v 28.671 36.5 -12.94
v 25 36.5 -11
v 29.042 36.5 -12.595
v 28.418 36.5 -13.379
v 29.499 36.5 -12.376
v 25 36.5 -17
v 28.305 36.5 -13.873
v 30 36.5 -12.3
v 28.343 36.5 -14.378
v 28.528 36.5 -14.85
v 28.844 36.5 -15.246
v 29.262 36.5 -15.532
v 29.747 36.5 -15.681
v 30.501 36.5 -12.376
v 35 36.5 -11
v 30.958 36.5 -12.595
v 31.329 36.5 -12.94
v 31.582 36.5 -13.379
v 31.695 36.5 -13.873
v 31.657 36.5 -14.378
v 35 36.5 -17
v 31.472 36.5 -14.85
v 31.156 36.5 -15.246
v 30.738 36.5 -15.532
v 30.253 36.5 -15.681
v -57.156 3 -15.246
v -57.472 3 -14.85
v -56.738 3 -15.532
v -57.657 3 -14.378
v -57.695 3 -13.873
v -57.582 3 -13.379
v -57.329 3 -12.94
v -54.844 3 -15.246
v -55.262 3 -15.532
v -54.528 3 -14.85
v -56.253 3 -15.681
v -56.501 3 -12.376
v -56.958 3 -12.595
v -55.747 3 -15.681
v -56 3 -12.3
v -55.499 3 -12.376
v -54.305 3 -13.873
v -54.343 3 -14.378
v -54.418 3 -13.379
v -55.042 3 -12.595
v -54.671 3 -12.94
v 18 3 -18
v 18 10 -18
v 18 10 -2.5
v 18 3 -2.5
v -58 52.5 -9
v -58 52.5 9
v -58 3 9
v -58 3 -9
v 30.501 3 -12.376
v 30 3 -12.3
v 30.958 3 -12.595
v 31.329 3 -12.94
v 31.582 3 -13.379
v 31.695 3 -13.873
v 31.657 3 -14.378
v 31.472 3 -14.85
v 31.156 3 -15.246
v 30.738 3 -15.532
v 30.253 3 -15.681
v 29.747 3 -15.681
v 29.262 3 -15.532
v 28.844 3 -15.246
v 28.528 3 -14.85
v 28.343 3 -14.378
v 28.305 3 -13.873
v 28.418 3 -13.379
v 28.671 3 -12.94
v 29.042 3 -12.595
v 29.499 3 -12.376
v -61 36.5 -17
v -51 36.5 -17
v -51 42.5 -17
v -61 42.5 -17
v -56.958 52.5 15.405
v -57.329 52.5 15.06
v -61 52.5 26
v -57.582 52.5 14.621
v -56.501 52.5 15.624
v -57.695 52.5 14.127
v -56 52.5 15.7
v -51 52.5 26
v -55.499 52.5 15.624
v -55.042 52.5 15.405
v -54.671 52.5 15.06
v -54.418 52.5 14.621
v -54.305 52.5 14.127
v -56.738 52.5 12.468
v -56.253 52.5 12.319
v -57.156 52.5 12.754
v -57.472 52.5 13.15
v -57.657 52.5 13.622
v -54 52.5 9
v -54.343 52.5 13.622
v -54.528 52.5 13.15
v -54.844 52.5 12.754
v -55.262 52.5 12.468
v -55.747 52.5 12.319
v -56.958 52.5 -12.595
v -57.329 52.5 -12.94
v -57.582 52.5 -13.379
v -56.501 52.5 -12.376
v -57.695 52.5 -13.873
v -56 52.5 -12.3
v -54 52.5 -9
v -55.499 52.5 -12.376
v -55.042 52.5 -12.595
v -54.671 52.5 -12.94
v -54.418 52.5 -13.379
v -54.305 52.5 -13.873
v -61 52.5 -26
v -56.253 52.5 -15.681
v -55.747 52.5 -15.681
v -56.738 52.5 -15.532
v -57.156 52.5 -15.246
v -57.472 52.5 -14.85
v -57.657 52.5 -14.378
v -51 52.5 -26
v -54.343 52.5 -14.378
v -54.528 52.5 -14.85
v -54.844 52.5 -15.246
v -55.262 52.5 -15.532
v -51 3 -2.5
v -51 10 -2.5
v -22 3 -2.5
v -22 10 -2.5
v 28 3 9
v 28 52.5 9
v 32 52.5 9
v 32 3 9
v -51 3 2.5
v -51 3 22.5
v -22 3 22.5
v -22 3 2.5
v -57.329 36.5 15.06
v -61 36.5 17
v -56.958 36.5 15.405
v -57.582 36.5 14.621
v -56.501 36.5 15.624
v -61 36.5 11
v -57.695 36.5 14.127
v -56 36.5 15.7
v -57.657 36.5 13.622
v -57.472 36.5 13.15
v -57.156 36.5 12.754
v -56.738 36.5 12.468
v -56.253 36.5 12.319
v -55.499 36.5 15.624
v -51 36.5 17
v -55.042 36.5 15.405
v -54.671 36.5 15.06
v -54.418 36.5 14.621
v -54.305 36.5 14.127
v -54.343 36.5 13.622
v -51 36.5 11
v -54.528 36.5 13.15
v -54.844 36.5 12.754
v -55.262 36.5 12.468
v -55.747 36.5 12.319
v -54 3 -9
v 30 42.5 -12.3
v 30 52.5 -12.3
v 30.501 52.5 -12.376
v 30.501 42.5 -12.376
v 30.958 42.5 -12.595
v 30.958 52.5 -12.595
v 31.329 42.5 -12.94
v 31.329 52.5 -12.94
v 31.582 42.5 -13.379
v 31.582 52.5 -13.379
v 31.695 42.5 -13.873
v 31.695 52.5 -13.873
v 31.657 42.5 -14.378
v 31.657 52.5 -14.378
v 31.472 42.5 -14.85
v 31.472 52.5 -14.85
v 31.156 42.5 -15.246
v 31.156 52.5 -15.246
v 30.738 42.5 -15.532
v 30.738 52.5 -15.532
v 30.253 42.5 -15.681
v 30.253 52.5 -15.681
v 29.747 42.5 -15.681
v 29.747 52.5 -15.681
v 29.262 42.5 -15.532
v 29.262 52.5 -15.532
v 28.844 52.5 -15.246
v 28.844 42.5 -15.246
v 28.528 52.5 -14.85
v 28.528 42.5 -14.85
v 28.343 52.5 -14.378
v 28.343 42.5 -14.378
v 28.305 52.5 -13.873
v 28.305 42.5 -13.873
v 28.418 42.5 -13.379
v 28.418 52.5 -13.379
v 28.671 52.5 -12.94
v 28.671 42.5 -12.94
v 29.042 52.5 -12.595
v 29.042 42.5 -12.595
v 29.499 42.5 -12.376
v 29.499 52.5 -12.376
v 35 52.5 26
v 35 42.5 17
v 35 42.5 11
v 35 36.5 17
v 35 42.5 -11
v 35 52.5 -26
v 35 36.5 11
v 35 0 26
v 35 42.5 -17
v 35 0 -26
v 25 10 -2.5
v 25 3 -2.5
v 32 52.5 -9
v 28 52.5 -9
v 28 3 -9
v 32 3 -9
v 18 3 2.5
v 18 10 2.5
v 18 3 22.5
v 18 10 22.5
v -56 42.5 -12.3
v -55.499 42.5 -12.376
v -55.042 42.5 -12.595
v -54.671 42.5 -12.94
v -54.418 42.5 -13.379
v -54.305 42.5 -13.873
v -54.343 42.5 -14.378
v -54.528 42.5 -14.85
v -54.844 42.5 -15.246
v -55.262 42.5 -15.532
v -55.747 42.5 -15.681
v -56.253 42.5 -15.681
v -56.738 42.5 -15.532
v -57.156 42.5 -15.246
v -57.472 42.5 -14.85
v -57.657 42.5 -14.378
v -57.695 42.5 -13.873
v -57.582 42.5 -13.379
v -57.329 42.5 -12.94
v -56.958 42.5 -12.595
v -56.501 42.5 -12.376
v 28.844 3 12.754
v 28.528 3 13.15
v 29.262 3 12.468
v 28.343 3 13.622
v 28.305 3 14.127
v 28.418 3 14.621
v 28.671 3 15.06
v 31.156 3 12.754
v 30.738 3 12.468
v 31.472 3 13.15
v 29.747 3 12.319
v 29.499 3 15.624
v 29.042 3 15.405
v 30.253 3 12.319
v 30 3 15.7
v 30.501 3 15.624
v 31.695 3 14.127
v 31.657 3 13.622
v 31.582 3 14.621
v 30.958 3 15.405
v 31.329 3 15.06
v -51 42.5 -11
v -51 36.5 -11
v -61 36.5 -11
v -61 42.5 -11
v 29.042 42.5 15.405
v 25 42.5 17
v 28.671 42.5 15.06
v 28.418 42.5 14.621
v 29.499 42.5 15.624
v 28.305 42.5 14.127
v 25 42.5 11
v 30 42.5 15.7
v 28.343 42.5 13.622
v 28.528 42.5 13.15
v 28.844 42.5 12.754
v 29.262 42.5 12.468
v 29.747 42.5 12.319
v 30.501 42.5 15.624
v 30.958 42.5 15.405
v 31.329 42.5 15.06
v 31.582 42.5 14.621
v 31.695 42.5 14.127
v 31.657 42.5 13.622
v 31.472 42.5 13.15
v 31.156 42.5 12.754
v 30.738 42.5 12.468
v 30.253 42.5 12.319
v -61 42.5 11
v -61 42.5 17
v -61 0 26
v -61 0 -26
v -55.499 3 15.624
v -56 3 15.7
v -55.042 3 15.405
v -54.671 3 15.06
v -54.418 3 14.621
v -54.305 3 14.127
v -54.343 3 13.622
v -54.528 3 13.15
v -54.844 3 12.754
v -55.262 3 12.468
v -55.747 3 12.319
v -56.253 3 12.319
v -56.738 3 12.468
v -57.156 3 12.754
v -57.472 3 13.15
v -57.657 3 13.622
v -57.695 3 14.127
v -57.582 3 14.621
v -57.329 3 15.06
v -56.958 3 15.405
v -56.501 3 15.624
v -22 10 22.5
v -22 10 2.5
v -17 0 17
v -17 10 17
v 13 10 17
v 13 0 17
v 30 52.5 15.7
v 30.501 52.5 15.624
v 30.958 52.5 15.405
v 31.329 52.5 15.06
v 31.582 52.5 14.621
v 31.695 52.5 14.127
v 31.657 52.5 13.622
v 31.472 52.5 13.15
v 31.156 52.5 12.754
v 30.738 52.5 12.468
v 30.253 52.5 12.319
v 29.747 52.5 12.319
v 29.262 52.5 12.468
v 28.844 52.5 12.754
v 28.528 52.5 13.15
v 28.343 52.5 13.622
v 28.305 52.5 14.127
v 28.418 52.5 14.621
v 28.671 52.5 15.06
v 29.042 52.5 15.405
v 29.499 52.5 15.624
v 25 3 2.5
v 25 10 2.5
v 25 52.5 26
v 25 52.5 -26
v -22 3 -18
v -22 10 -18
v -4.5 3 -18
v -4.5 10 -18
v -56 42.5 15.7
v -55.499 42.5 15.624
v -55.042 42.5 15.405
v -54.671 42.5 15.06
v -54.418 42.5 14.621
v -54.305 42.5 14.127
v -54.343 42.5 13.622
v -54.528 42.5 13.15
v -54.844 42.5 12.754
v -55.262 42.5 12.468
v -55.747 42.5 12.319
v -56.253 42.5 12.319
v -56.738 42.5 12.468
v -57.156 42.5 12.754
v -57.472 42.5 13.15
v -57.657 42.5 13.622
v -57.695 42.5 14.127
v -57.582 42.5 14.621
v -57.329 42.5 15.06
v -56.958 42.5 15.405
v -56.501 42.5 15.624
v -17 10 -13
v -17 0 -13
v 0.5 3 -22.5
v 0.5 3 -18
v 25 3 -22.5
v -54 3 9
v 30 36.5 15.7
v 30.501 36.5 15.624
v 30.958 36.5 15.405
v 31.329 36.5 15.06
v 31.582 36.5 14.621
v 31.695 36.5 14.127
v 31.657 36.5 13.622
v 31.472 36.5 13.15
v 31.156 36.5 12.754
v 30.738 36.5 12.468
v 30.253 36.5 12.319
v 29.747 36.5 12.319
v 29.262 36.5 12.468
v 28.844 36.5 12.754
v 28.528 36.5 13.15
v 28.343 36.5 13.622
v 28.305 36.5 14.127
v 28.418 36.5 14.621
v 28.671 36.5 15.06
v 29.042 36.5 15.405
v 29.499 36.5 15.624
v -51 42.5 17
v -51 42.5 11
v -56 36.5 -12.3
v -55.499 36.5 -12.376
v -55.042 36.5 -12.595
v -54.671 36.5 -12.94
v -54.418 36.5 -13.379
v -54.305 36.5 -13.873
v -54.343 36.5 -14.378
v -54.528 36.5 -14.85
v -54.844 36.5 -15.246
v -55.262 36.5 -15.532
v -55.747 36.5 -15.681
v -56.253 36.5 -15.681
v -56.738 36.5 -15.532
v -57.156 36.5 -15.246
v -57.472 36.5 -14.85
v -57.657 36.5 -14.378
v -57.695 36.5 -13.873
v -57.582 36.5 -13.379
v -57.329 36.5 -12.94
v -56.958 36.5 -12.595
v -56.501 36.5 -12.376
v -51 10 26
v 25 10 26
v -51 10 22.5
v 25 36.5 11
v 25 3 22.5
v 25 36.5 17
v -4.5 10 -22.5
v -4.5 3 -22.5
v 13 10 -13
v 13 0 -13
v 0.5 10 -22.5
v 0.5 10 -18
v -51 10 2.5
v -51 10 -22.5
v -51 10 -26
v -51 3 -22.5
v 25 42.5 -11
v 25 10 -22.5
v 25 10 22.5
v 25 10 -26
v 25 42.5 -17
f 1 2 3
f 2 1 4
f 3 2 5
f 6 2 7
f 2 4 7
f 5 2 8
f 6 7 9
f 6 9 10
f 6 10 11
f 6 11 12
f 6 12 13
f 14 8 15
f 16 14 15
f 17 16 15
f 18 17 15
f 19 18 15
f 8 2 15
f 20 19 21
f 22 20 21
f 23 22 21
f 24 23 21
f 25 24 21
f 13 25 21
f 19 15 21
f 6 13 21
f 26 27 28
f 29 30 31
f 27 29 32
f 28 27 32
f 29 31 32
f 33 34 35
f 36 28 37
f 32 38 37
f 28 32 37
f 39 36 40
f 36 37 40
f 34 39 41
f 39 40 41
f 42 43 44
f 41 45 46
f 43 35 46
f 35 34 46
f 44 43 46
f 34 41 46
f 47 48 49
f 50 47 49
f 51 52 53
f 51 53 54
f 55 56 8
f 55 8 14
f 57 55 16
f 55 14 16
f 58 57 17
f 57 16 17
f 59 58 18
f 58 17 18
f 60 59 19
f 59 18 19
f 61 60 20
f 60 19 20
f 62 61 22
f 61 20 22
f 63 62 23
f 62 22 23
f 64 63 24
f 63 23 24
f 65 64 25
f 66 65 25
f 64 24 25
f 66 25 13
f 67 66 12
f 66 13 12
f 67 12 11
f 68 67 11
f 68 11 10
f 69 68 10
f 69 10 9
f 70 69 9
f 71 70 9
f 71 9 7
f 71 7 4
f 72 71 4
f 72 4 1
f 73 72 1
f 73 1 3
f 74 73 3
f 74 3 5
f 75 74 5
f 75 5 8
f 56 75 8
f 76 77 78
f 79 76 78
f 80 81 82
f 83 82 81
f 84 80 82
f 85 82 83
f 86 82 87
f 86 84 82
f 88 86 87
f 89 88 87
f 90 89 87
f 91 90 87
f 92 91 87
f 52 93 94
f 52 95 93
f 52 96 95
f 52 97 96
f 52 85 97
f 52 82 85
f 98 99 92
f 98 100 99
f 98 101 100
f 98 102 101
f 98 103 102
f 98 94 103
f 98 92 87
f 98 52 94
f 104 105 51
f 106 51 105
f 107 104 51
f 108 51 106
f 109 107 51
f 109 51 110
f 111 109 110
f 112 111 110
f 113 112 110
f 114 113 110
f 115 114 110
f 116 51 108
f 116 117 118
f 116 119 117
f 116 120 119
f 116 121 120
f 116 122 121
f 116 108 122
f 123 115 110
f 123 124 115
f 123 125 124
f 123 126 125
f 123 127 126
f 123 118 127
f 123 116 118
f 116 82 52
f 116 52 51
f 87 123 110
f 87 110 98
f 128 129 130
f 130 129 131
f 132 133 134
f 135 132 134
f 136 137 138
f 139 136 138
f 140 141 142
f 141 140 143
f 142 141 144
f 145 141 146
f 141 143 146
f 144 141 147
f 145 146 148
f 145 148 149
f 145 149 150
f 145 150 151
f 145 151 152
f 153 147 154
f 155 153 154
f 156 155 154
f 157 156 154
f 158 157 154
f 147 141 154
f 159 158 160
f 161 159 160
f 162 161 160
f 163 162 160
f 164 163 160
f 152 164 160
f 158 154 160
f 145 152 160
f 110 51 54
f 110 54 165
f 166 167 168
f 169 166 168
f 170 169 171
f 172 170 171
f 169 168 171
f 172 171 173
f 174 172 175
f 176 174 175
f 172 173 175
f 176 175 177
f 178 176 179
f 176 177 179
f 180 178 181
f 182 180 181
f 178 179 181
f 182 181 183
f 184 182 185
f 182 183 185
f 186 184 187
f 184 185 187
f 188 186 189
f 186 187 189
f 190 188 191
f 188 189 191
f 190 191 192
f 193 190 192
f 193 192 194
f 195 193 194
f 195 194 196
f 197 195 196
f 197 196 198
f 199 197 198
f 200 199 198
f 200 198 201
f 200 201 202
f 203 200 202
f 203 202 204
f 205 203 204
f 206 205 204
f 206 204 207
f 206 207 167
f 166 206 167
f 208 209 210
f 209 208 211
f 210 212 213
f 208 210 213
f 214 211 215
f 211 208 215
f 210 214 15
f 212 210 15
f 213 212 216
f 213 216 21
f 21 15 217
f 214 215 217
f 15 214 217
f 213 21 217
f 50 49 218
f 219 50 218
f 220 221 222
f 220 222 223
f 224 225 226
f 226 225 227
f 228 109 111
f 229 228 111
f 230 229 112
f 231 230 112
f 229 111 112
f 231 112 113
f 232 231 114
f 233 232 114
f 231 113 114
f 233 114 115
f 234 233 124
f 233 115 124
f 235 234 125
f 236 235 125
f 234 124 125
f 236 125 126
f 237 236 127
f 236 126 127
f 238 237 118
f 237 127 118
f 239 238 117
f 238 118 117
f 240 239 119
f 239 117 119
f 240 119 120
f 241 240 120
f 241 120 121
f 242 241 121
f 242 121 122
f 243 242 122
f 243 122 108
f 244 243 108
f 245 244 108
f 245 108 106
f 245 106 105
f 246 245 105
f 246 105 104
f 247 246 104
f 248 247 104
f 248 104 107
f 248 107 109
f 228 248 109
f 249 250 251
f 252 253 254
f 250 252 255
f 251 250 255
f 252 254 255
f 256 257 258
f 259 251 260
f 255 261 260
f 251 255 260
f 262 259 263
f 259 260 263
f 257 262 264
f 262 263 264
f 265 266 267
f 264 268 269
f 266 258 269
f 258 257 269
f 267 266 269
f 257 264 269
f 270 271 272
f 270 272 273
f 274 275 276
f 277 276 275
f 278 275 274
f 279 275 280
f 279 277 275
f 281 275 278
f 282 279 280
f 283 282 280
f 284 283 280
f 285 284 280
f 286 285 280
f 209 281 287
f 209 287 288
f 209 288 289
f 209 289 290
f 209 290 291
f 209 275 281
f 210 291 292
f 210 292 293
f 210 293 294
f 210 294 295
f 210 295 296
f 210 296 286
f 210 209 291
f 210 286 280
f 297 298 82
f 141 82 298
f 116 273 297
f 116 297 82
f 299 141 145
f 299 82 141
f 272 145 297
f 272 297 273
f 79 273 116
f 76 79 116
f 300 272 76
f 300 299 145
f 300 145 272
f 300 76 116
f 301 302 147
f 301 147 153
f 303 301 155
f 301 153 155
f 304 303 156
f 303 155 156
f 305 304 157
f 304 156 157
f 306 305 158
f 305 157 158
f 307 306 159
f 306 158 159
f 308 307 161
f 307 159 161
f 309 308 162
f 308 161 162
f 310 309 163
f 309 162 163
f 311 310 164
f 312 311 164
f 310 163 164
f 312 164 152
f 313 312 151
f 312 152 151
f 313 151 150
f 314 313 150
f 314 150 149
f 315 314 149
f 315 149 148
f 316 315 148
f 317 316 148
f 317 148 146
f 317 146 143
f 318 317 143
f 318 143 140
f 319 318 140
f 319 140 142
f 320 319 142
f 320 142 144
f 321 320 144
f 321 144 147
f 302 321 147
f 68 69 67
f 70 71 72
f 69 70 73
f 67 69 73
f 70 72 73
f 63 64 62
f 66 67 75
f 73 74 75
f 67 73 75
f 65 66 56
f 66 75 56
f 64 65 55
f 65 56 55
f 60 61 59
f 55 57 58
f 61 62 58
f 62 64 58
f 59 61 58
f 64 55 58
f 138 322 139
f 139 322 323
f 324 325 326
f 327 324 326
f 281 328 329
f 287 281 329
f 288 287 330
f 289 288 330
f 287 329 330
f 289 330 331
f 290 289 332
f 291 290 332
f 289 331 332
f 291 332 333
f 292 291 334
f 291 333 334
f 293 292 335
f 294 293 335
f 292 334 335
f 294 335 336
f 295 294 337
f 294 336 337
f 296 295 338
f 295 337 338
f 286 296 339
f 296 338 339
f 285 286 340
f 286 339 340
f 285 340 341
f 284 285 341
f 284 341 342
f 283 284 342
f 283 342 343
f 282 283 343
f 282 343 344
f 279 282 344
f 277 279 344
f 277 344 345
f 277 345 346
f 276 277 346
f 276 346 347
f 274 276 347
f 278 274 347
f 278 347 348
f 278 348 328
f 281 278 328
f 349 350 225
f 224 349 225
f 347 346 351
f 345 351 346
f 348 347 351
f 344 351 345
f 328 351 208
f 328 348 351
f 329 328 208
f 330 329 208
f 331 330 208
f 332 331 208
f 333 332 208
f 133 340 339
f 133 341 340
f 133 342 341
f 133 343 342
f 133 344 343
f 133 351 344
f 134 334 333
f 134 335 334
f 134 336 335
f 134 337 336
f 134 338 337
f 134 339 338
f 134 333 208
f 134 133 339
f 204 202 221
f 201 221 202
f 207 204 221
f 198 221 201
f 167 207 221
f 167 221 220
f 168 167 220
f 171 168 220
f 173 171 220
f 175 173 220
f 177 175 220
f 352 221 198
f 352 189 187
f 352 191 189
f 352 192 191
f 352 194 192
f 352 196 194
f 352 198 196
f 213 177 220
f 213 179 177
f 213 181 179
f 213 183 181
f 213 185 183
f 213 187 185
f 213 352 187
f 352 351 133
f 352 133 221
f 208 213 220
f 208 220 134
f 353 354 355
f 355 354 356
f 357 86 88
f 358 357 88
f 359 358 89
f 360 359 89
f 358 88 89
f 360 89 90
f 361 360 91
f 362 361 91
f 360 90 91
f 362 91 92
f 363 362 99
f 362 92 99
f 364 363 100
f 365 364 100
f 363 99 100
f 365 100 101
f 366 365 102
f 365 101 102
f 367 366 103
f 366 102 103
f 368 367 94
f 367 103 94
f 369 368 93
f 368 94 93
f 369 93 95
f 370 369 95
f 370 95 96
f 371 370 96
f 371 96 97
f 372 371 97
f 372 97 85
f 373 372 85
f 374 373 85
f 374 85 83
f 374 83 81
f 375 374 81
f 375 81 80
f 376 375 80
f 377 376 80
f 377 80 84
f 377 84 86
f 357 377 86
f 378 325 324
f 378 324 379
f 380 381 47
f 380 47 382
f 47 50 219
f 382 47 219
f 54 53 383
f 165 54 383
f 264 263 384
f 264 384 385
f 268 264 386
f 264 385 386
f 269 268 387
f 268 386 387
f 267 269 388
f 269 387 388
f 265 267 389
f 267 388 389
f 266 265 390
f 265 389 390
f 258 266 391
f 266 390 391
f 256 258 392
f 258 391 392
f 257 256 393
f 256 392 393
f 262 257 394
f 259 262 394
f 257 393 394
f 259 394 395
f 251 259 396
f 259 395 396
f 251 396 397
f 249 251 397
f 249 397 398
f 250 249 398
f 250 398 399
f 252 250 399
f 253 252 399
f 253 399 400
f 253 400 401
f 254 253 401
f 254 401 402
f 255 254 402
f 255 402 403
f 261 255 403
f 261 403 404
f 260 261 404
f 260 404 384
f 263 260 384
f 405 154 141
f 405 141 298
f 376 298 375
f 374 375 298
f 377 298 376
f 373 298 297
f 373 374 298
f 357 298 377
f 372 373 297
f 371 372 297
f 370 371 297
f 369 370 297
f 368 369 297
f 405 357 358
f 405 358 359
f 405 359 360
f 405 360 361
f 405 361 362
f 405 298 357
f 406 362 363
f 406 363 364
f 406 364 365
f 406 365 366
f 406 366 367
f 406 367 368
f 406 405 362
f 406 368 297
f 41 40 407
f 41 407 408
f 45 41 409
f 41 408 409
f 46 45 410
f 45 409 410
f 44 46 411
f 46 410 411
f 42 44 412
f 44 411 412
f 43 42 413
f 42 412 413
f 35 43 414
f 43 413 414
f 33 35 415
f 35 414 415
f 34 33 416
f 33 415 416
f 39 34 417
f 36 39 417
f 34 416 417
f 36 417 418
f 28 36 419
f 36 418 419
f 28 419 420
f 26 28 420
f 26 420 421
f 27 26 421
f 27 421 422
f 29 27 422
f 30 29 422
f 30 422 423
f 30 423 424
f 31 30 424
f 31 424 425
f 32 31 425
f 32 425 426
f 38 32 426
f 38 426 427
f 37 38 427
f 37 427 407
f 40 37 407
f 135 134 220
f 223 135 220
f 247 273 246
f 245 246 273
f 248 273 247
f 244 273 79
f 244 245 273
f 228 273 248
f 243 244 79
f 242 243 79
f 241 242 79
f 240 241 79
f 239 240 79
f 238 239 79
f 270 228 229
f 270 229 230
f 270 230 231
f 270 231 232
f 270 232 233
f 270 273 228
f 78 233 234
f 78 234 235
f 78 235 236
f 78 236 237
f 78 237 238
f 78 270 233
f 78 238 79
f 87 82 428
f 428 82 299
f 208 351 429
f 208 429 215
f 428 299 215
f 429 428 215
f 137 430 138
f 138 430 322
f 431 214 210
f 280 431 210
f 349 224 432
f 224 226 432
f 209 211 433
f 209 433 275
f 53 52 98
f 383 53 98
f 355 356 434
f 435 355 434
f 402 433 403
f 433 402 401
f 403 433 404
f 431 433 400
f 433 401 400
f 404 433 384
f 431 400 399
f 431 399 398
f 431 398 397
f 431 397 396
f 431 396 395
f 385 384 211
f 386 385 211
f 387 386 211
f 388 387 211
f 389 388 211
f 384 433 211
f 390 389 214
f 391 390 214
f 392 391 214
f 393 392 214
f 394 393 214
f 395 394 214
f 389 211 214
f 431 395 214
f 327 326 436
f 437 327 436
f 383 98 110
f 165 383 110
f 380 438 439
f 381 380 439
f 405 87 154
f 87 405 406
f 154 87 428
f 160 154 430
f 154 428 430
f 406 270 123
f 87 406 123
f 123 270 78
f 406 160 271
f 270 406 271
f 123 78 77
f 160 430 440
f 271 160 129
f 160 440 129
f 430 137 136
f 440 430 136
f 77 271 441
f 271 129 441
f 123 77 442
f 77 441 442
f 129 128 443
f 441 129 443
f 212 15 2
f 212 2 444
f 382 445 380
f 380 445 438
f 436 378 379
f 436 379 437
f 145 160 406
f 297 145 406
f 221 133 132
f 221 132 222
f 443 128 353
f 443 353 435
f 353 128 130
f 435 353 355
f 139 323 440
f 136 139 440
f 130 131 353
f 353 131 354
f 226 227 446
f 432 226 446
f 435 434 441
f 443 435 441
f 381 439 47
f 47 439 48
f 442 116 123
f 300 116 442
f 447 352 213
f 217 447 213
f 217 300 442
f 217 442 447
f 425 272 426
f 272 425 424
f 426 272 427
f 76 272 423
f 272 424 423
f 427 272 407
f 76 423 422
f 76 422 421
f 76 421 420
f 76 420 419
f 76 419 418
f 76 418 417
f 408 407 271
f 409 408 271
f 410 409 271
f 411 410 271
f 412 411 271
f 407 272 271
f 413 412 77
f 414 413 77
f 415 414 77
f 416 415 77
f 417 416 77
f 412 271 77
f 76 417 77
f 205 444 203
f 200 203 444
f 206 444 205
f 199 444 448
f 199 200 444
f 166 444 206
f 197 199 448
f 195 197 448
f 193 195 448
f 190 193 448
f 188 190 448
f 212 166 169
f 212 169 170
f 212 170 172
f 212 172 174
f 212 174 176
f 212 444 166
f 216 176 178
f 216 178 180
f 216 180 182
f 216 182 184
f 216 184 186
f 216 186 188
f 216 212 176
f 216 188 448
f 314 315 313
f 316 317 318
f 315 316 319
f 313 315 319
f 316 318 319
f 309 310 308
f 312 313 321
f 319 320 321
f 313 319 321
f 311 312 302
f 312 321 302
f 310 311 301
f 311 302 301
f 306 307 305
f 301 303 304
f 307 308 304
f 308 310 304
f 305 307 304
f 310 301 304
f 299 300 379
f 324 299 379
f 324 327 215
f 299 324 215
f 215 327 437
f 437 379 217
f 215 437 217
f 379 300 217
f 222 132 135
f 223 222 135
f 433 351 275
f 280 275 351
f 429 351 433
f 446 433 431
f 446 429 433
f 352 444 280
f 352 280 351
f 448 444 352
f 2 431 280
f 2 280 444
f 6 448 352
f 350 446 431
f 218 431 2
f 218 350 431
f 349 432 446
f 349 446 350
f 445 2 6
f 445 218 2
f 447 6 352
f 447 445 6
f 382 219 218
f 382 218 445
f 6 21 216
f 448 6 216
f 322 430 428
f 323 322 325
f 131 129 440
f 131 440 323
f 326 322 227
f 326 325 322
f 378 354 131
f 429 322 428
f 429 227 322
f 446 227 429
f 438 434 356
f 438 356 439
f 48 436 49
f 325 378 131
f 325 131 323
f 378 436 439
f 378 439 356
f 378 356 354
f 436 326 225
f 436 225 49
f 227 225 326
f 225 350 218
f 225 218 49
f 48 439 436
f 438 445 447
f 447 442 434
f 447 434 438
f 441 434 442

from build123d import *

# Parameters (mm, degrees)
SKETCH1_W           = 96
SKETCH1_H           = 52
BOSS_EXTRUDE1_DEPTH = 10
SKETCH3_W           = 30
SKETCH3_H           = 30
CUT_EXTRUDE1_DEPTH  = 10
SKETCH4_W           = 10
SKETCH4_H           = 52
BOSS_EXTRUDE2_DEPTH = 42.5
CUT_EXTRUDE2_DEPTH  = 25
SKETCH10_W          = 6
SKETCH10_H          = 6
CUT_EXTRUDE7_DEPTH  = 113.464438824
SKETCH11_R          = 1.7
SKETCH11_W          = 4
SKETCH11_H          = 18
CUT_EXTRUDE8_DEPTH  = 60
SKETCH14_W          = 96
SKETCH14_H          = 52
SKETCH14_W_2        = 30
SKETCH14_H_2        = 30
BOSS_EXTRUDE3_DEPTH = 3


with BuildPart() as part:
    # Sketch1 → Boss-Extrude1 (new body)
    with BuildSketch(Plane(origin=(0, 0, 0), x_dir=(1, 0, 0), z_dir=(0, 1, 0))):
        with Locations((-13, 0)):
            Rectangle(SKETCH1_W, SKETCH1_H)
    extrude(amount=BOSS_EXTRUDE1_DEPTH)

    # Sketch3 → Cut-Extrude1 (cut)
    with BuildSketch(Plane(origin=(0, 10, 0), x_dir=(1, 0, 0), z_dir=(0, 1, 0))):
        with Locations((-2, -2)):
            Rectangle(SKETCH3_W, SKETCH3_H)
    extrude(amount=-CUT_EXTRUDE1_DEPTH, mode=Mode.SUBTRACT)

    # Sketch4 → Boss-Extrude2 (add)
    with BuildSketch(Plane(origin=(0, 10, 0), x_dir=(1, 0, 0), z_dir=(0, 1, 0))):
        with Locations((30, 0)):
            Rectangle(SKETCH4_W, SKETCH4_H)
        with Locations((-56, 0)):
            Rectangle(SKETCH4_W, SKETCH4_H)
    extrude(amount=BOSS_EXTRUDE2_DEPTH)

    # Sketch5 → Cut-Extrude2 (cut)
    with BuildSketch(Plane(origin=(0, 10, 0), x_dir=(1, 0, 0), z_dir=(0, 1, 0))):
        Polygon((25, 22.5), (0.5, 22.5), (0.5, 18), (18, 18), (18, 2.5), (25, 2.5), align=None)
        Polygon((-4.5, 22.5), (-51, 22.5), (-51, 2.5), (-22, 2.5), (-22, 18), (-4.5, 18), align=None)
        Polygon((-22, -2.5), (-51, -2.5), (-51, -22.5), (-22, -22.5), (-22, -20), align=None)
        Polygon((25, -22.5), (25, -2.5), (18, -2.5), (18, -20), (18, -22.5), align=None)
    extrude(amount=-CUT_EXTRUDE2_DEPTH, mode=Mode.SUBTRACT)

    # Sketch10 → Cut-Extrude7 (cut, through all)
    with BuildSketch(Plane(origin=(35, 0, 0), x_dir=(0, 0, -1), z_dir=(1, 0, 0))):
        with Locations((14, 39.5)):
            Rectangle(SKETCH10_W, SKETCH10_H)
        with Locations((-14, 39.5)):
            Rectangle(SKETCH10_W, SKETCH10_H)
    extrude(amount=-CUT_EXTRUDE7_DEPTH, mode=Mode.SUBTRACT)

    # Sketch11 → Cut-Extrude8 (cut)
    with BuildSketch(Plane(origin=(0, 52.5, 0), x_dir=(1, 0, 0), z_dir=(0, 1, 0))):
        with Locations(Location((-56, 14, 0), (0, 0, 270))):
            Circle(SKETCH11_R)
        with Locations(Location((-56, -14, 0), (0, 0, 270))):
            Circle(SKETCH11_R)
        with Locations(Location((30, -14, 0), (0, 0, 270))):
            Circle(SKETCH11_R)
        with Locations(Location((30, 14, 0), (0, 0, 270))):
            Circle(SKETCH11_R)
        with Locations((-56, 0)):
            Rectangle(SKETCH11_W, SKETCH11_H)
        with Locations((30, 0)):
            Rectangle(SKETCH11_W, SKETCH11_H)
    extrude(amount=-CUT_EXTRUDE8_DEPTH, mode=Mode.SUBTRACT)

    # Sketch14 → Boss-Extrude3 (add)
    with BuildSketch(Plane.XZ):
        with Locations((-13, 0)):
            Rectangle(SKETCH14_W, SKETCH14_H)
        with Locations((-2, 2)):
            Rectangle(SKETCH14_W_2, SKETCH14_H_2, mode=Mode.SUBTRACT)
    extrude(amount=-BOSS_EXTRUDE3_DEPTH)


solid = part.part
